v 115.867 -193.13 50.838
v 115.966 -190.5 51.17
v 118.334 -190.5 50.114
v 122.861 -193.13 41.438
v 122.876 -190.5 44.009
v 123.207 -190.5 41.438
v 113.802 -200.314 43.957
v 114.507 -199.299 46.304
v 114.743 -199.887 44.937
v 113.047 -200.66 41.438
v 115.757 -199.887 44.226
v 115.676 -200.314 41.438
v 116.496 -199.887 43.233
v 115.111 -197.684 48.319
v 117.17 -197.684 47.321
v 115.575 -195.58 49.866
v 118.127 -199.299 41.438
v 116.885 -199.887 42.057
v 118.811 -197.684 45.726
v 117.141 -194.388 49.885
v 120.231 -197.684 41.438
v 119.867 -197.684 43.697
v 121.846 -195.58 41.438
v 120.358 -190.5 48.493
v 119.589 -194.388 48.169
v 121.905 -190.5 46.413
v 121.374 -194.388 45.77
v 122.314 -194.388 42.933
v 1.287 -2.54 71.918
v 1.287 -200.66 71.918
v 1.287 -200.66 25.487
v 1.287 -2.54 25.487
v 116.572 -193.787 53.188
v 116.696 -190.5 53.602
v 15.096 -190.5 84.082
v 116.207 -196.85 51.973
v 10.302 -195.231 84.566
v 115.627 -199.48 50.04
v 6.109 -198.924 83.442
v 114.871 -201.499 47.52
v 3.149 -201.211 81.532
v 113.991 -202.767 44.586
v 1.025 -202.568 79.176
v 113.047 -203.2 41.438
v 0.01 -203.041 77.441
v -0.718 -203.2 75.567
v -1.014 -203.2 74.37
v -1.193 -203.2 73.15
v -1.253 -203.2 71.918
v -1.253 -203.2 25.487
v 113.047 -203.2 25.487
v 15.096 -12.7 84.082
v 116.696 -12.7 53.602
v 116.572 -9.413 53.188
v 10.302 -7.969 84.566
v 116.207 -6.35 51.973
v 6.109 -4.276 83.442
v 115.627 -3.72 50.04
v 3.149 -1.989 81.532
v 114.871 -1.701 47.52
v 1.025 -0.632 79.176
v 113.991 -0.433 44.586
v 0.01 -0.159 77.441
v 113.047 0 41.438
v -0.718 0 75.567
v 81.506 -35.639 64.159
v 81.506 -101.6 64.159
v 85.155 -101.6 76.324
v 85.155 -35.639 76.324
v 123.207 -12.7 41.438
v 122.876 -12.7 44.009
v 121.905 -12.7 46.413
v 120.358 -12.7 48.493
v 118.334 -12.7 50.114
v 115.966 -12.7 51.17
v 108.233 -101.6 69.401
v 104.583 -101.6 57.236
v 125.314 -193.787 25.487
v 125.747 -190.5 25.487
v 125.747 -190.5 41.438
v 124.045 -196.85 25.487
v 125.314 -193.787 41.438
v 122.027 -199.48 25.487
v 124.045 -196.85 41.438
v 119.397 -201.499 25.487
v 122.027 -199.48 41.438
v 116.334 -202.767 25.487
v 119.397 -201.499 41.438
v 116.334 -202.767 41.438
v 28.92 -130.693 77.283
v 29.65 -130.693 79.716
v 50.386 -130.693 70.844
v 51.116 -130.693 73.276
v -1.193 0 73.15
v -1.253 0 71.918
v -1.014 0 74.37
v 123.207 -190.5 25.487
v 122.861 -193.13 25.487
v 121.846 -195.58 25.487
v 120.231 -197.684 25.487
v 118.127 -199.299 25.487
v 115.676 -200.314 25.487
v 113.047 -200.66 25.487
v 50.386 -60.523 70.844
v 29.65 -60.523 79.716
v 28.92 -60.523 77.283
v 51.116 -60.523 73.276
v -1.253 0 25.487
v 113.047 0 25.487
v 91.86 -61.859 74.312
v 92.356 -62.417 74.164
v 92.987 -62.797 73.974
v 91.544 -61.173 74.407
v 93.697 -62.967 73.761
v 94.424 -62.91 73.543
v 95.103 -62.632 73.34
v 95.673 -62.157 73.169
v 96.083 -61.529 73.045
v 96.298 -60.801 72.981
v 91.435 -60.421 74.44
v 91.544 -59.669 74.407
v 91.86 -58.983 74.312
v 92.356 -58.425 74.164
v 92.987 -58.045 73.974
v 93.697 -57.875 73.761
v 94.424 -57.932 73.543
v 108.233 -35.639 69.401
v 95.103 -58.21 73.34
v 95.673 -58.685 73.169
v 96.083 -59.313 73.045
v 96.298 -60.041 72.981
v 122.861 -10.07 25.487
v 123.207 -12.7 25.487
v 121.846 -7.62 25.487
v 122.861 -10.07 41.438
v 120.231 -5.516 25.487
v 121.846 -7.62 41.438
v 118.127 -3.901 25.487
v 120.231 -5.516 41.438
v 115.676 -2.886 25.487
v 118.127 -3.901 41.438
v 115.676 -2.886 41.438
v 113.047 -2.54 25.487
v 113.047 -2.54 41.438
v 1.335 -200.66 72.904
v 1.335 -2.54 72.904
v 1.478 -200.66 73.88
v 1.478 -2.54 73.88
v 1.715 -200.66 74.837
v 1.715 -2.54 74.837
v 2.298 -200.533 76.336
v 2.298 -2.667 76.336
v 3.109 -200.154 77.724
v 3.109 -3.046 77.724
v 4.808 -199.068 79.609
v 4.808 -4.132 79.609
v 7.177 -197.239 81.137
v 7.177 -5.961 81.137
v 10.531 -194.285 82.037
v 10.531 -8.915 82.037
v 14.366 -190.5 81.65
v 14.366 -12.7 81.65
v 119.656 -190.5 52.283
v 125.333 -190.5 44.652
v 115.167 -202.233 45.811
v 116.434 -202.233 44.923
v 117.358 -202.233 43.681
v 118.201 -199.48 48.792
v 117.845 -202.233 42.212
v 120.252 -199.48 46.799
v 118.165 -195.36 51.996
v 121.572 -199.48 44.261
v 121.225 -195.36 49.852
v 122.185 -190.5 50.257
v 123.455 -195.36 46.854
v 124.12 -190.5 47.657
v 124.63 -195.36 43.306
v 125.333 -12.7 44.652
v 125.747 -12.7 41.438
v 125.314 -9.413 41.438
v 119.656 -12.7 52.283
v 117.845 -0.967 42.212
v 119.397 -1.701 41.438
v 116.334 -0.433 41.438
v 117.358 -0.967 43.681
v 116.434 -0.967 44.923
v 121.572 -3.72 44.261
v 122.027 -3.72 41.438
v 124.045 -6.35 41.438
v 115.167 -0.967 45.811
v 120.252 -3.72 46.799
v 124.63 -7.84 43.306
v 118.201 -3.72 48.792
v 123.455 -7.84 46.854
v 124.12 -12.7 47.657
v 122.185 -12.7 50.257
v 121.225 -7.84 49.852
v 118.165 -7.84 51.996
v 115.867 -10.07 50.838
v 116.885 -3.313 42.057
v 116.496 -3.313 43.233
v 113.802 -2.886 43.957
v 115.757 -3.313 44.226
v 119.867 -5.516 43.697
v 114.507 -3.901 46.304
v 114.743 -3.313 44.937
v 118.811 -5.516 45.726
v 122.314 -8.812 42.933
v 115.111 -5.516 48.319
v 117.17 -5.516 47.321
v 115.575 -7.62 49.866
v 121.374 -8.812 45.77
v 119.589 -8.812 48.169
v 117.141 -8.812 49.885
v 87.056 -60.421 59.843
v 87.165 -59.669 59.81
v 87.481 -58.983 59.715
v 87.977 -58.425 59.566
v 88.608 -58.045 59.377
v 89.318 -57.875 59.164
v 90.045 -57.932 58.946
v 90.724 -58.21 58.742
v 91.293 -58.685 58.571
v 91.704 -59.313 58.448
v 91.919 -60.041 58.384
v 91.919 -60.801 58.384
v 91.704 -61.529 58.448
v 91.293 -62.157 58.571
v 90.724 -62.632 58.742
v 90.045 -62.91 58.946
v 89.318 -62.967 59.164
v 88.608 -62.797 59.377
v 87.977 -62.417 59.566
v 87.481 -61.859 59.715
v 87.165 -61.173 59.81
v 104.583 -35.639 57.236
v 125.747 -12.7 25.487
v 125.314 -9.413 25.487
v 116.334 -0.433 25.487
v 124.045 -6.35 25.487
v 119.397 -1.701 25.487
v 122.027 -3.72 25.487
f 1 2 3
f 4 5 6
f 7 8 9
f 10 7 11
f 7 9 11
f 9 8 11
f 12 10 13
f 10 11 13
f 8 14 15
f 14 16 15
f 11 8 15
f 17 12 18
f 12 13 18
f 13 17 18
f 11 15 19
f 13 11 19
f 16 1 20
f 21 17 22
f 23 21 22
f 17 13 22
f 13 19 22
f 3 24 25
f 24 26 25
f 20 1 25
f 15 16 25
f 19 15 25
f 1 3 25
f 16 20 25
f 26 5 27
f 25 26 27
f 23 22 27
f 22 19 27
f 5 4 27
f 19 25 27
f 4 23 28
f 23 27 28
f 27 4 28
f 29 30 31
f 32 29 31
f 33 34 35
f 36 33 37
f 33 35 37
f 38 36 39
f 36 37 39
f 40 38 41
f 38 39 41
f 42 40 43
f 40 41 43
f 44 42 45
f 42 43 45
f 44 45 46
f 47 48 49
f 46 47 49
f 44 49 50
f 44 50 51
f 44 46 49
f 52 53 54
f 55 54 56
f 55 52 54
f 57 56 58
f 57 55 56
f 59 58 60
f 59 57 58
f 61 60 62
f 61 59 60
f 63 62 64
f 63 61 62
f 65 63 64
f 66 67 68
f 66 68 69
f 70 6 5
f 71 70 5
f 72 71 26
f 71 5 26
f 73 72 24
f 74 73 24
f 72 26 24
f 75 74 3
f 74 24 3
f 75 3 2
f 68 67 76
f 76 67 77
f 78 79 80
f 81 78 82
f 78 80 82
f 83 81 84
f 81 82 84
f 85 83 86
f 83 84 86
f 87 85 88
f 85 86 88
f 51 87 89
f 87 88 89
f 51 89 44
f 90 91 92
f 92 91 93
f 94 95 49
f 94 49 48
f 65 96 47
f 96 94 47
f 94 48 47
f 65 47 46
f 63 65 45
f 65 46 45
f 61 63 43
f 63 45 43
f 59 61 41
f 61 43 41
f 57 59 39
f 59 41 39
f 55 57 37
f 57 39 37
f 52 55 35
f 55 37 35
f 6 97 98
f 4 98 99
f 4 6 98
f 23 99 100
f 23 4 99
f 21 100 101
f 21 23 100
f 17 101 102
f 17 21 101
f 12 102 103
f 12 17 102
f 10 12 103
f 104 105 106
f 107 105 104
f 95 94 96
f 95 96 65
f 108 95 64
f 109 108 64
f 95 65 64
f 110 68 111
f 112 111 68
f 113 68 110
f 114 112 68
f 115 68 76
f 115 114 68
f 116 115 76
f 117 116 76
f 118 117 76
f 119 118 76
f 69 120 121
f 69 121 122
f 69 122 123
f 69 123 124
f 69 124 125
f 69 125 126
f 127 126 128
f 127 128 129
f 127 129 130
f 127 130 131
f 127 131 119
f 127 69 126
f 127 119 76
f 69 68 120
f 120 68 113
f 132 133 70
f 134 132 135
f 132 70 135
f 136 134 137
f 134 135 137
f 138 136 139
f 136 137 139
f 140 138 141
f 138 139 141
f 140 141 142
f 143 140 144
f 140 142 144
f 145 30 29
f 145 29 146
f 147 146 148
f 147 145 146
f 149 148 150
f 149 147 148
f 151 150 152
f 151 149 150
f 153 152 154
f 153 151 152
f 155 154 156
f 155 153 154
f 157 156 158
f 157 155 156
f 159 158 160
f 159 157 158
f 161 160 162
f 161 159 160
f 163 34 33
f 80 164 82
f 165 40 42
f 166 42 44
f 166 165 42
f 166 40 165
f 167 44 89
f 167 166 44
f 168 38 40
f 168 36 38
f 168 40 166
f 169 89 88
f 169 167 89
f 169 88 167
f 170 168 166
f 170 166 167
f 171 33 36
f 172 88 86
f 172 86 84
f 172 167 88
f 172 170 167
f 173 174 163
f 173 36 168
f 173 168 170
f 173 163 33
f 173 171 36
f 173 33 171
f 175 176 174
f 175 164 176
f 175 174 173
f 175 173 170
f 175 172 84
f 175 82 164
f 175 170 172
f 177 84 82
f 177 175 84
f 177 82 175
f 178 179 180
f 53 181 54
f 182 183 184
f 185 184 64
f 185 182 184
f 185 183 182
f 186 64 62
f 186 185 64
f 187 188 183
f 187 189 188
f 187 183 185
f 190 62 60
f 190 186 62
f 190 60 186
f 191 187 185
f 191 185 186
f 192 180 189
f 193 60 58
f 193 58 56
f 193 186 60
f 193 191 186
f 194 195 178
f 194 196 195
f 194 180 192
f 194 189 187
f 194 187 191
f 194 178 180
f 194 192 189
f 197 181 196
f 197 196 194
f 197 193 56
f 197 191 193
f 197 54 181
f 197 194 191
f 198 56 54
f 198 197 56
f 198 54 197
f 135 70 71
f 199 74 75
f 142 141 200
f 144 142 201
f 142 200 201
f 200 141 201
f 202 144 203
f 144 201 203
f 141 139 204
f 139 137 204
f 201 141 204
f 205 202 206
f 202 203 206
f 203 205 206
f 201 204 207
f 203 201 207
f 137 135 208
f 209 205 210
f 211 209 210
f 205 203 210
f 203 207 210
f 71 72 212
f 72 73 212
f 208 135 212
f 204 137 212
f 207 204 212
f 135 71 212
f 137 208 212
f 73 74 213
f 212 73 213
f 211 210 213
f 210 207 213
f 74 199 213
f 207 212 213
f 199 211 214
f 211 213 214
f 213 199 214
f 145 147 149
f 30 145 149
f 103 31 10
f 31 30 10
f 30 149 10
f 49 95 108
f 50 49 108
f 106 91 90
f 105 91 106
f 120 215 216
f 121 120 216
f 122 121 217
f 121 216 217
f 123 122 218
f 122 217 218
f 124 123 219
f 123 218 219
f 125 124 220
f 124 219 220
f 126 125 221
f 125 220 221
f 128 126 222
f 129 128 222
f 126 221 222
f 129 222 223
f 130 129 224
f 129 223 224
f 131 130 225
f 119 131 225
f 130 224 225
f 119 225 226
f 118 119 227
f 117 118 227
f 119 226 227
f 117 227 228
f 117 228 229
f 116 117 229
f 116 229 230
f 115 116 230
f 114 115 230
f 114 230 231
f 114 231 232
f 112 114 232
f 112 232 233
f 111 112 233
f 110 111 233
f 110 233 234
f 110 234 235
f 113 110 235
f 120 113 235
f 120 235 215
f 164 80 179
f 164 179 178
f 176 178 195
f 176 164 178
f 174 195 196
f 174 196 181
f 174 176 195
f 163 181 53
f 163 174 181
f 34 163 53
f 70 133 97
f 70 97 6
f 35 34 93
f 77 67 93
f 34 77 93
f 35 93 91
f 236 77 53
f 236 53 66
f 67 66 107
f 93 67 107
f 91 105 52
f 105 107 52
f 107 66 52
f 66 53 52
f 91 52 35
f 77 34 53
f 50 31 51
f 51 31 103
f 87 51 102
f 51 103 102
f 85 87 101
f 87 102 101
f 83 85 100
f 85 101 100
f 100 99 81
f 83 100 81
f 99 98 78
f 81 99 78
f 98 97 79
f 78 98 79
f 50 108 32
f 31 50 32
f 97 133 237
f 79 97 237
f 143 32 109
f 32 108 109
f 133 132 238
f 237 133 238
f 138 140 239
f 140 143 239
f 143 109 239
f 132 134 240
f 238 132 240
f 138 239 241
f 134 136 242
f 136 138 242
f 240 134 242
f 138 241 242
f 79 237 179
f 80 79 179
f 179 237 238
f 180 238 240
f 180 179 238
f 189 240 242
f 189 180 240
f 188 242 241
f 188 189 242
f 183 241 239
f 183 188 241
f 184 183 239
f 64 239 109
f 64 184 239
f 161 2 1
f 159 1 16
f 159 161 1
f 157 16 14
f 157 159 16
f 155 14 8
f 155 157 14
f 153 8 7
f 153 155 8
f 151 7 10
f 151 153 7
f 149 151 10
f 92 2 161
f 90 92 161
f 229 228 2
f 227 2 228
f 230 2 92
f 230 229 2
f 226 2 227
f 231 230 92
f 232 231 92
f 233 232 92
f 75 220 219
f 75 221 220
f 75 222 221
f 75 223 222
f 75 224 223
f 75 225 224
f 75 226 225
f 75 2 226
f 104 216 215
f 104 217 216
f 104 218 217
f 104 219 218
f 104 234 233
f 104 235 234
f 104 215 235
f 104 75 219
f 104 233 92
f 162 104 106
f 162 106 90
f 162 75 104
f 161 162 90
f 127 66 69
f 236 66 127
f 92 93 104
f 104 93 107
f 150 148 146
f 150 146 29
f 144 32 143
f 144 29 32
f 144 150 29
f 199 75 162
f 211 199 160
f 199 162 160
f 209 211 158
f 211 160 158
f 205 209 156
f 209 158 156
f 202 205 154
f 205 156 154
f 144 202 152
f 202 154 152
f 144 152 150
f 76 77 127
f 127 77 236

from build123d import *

# Parameters (mm, degrees)
F1_DEPTH = 203.2
F2_R     = 12.7
F3_T     = -2.54
F4_W     = 22.4106954411
F4_H     = 70.1701231301
F5_DEPTH = 25.4
F6_W     = 24.0932293236
F6_H     = 65.9613286316
F7_DEPTH = 12.7
F9_D     = 5.1054


with BuildPart() as f1:
    # F0 (on Front) → F1 (new body)
    with BuildSketch(Plane.XZ):
        Polygon((-1.2532134056, 88.9871907368), (-1.2532134056, 25.4871907368), (125.7467865944, 25.4871907368), (125.7467865944, 50.8871907368), align=None)
    extrude(amount=F1_DEPTH)

    # F2
    f2_edges = [f1.edges().sort_by_distance(p)[0] for p in [
        (-1.253213, -101.6, 88.987191),
        (62.246787, 0, 69.937191),
        (125.746787, -101.6, 50.887191),
        (62.246787, -203.2, 69.937191),
        (125.746787, -203.2, 38.187191),
        (125.746787, 0, 38.187191),
    ]]
    fillet(f2_edges, radius=F2_R)

    # F3
    f3_openings = [f1.faces().sort_by_distance(p)[0] for p in [
        (62.083618, -101.6, 25.487191),
    ]]
    offset(amount=F3_T, openings=f3_openings)

    # F4 (on face) → F5 (cut)
    with BuildSketch(Plane(origin=(24.3884110225, 0, 81.2947034084), x_dir=(0.9578262852, 0, -0.2873478856), z_dir=(0.2873478856, 0, 0.9578262852))):
        with Locations((16.6988200508, -95.6082399935)):
            Rectangle(F4_W, F4_H)
    extrude(amount=-F5_DEPTH, mode=Mode.SUBTRACT)

    # F6 (on face) → F7 (join)
    with BuildSketch(Plane(origin=(24.3884110225, 0, 81.2947034084), x_dir=(0.9578262852, 0, -0.2873478856), z_dir=(0.2873478856, 0, 0.9578262852))):
        with Locations((71.6791953892, -68.6193356842)):
            Rectangle(F6_W, F6_H)
    extrude(amount=F7_DEPTH)

    # F9 (through all)
    with Locations(Plane(origin=(28.0377291692, 0, 93.4590972307), x_dir=(0.9578262852, 0, -0.2873478856), z_dir=(0.2873478856, 0, 0.9578262852))):
        with Locations((68.7415376306, -60.4210160673)):
            Hole(F9_D / 2)


solid = f1.part
